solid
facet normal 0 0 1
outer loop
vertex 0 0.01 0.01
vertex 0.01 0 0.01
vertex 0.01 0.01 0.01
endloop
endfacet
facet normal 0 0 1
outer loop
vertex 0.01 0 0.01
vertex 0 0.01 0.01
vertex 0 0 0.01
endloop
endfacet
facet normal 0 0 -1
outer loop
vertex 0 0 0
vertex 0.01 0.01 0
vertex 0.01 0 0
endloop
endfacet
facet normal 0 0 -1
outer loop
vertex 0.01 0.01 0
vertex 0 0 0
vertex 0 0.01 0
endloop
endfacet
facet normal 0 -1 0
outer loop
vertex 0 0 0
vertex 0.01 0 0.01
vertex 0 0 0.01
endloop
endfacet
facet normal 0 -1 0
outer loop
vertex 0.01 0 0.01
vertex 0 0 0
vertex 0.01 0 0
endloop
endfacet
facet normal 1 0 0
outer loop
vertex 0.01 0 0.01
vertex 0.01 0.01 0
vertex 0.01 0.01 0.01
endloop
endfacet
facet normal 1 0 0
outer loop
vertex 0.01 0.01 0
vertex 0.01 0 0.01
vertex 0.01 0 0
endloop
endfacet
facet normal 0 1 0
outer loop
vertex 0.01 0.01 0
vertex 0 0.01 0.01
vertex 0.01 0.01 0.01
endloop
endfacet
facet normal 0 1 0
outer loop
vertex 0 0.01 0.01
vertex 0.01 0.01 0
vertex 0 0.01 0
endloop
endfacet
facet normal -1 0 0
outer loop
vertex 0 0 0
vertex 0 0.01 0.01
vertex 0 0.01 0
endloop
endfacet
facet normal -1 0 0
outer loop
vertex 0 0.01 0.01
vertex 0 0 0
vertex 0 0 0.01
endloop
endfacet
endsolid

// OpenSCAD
/***
 * @function common_harmonic_equivalence
 * @brief Check named harmonic adapters against their independent analytic laws and retain distinct scaling policies.
 * Source: [`common/harmonic_equivalence.scad`](common/harmonic_equivalence.scad)
 */
include <../../src/fourier/base.scad>
include <../../src/lobed/base.scad>
include <../../src/pascal/base.scad>
include <../../src/temple_fay/base.scad>
include <../../src/cosine_quintic/base.scad>
for(theta=[0:.5:360]) {
    assert(abs(_cg_lobed_unit_radius(4,.13,theta)-(1+.13*cos(4*theta)))<1e-12);
    // Pascal deliberately supports eccentricity beyond Fourier's public .9 limit.
    assert(abs(_cg_pascal_unit_radius(.95,theta)-(1+.95*cos(theta)))<1e-12);
    assert(abs(_cg_temple_fay_unit_radius(theta,.32,.12)-(1+.32*sin(2*theta)+.12*sin(4*theta)))<1e-12);
    assert(abs(_cg_cosine_quintic_unit_radius(theta,.19,2)-(1+.19*pow(cos(2*theta),5)))<1e-12);
    assert(abs(_cg_fourier_radius(3,[[2,.1,0],[3,.2,45]],theta)-3*(1+.1*cos(2*theta)+.2*cos(3*theta+45)))<1e-12);
}
assert(!_cg_fourier_coefficients_valid([[1,.95,0]]),"Fourier public amplitude domain changed");
shape=_cg_lobed_shape(.8,34,4,.13,720);
assert(abs(_cg_closed_polyline_perimeter(shape[0])-_cg_pi*.8*34)<1e-9,"lobed perimeter scale changed");
assert(_cg_fourier_radius(.8*34/2,[[2,.1,0]],0)==.8*34/2*1.1,"Fourier radius scale changed");
cube(.01);
